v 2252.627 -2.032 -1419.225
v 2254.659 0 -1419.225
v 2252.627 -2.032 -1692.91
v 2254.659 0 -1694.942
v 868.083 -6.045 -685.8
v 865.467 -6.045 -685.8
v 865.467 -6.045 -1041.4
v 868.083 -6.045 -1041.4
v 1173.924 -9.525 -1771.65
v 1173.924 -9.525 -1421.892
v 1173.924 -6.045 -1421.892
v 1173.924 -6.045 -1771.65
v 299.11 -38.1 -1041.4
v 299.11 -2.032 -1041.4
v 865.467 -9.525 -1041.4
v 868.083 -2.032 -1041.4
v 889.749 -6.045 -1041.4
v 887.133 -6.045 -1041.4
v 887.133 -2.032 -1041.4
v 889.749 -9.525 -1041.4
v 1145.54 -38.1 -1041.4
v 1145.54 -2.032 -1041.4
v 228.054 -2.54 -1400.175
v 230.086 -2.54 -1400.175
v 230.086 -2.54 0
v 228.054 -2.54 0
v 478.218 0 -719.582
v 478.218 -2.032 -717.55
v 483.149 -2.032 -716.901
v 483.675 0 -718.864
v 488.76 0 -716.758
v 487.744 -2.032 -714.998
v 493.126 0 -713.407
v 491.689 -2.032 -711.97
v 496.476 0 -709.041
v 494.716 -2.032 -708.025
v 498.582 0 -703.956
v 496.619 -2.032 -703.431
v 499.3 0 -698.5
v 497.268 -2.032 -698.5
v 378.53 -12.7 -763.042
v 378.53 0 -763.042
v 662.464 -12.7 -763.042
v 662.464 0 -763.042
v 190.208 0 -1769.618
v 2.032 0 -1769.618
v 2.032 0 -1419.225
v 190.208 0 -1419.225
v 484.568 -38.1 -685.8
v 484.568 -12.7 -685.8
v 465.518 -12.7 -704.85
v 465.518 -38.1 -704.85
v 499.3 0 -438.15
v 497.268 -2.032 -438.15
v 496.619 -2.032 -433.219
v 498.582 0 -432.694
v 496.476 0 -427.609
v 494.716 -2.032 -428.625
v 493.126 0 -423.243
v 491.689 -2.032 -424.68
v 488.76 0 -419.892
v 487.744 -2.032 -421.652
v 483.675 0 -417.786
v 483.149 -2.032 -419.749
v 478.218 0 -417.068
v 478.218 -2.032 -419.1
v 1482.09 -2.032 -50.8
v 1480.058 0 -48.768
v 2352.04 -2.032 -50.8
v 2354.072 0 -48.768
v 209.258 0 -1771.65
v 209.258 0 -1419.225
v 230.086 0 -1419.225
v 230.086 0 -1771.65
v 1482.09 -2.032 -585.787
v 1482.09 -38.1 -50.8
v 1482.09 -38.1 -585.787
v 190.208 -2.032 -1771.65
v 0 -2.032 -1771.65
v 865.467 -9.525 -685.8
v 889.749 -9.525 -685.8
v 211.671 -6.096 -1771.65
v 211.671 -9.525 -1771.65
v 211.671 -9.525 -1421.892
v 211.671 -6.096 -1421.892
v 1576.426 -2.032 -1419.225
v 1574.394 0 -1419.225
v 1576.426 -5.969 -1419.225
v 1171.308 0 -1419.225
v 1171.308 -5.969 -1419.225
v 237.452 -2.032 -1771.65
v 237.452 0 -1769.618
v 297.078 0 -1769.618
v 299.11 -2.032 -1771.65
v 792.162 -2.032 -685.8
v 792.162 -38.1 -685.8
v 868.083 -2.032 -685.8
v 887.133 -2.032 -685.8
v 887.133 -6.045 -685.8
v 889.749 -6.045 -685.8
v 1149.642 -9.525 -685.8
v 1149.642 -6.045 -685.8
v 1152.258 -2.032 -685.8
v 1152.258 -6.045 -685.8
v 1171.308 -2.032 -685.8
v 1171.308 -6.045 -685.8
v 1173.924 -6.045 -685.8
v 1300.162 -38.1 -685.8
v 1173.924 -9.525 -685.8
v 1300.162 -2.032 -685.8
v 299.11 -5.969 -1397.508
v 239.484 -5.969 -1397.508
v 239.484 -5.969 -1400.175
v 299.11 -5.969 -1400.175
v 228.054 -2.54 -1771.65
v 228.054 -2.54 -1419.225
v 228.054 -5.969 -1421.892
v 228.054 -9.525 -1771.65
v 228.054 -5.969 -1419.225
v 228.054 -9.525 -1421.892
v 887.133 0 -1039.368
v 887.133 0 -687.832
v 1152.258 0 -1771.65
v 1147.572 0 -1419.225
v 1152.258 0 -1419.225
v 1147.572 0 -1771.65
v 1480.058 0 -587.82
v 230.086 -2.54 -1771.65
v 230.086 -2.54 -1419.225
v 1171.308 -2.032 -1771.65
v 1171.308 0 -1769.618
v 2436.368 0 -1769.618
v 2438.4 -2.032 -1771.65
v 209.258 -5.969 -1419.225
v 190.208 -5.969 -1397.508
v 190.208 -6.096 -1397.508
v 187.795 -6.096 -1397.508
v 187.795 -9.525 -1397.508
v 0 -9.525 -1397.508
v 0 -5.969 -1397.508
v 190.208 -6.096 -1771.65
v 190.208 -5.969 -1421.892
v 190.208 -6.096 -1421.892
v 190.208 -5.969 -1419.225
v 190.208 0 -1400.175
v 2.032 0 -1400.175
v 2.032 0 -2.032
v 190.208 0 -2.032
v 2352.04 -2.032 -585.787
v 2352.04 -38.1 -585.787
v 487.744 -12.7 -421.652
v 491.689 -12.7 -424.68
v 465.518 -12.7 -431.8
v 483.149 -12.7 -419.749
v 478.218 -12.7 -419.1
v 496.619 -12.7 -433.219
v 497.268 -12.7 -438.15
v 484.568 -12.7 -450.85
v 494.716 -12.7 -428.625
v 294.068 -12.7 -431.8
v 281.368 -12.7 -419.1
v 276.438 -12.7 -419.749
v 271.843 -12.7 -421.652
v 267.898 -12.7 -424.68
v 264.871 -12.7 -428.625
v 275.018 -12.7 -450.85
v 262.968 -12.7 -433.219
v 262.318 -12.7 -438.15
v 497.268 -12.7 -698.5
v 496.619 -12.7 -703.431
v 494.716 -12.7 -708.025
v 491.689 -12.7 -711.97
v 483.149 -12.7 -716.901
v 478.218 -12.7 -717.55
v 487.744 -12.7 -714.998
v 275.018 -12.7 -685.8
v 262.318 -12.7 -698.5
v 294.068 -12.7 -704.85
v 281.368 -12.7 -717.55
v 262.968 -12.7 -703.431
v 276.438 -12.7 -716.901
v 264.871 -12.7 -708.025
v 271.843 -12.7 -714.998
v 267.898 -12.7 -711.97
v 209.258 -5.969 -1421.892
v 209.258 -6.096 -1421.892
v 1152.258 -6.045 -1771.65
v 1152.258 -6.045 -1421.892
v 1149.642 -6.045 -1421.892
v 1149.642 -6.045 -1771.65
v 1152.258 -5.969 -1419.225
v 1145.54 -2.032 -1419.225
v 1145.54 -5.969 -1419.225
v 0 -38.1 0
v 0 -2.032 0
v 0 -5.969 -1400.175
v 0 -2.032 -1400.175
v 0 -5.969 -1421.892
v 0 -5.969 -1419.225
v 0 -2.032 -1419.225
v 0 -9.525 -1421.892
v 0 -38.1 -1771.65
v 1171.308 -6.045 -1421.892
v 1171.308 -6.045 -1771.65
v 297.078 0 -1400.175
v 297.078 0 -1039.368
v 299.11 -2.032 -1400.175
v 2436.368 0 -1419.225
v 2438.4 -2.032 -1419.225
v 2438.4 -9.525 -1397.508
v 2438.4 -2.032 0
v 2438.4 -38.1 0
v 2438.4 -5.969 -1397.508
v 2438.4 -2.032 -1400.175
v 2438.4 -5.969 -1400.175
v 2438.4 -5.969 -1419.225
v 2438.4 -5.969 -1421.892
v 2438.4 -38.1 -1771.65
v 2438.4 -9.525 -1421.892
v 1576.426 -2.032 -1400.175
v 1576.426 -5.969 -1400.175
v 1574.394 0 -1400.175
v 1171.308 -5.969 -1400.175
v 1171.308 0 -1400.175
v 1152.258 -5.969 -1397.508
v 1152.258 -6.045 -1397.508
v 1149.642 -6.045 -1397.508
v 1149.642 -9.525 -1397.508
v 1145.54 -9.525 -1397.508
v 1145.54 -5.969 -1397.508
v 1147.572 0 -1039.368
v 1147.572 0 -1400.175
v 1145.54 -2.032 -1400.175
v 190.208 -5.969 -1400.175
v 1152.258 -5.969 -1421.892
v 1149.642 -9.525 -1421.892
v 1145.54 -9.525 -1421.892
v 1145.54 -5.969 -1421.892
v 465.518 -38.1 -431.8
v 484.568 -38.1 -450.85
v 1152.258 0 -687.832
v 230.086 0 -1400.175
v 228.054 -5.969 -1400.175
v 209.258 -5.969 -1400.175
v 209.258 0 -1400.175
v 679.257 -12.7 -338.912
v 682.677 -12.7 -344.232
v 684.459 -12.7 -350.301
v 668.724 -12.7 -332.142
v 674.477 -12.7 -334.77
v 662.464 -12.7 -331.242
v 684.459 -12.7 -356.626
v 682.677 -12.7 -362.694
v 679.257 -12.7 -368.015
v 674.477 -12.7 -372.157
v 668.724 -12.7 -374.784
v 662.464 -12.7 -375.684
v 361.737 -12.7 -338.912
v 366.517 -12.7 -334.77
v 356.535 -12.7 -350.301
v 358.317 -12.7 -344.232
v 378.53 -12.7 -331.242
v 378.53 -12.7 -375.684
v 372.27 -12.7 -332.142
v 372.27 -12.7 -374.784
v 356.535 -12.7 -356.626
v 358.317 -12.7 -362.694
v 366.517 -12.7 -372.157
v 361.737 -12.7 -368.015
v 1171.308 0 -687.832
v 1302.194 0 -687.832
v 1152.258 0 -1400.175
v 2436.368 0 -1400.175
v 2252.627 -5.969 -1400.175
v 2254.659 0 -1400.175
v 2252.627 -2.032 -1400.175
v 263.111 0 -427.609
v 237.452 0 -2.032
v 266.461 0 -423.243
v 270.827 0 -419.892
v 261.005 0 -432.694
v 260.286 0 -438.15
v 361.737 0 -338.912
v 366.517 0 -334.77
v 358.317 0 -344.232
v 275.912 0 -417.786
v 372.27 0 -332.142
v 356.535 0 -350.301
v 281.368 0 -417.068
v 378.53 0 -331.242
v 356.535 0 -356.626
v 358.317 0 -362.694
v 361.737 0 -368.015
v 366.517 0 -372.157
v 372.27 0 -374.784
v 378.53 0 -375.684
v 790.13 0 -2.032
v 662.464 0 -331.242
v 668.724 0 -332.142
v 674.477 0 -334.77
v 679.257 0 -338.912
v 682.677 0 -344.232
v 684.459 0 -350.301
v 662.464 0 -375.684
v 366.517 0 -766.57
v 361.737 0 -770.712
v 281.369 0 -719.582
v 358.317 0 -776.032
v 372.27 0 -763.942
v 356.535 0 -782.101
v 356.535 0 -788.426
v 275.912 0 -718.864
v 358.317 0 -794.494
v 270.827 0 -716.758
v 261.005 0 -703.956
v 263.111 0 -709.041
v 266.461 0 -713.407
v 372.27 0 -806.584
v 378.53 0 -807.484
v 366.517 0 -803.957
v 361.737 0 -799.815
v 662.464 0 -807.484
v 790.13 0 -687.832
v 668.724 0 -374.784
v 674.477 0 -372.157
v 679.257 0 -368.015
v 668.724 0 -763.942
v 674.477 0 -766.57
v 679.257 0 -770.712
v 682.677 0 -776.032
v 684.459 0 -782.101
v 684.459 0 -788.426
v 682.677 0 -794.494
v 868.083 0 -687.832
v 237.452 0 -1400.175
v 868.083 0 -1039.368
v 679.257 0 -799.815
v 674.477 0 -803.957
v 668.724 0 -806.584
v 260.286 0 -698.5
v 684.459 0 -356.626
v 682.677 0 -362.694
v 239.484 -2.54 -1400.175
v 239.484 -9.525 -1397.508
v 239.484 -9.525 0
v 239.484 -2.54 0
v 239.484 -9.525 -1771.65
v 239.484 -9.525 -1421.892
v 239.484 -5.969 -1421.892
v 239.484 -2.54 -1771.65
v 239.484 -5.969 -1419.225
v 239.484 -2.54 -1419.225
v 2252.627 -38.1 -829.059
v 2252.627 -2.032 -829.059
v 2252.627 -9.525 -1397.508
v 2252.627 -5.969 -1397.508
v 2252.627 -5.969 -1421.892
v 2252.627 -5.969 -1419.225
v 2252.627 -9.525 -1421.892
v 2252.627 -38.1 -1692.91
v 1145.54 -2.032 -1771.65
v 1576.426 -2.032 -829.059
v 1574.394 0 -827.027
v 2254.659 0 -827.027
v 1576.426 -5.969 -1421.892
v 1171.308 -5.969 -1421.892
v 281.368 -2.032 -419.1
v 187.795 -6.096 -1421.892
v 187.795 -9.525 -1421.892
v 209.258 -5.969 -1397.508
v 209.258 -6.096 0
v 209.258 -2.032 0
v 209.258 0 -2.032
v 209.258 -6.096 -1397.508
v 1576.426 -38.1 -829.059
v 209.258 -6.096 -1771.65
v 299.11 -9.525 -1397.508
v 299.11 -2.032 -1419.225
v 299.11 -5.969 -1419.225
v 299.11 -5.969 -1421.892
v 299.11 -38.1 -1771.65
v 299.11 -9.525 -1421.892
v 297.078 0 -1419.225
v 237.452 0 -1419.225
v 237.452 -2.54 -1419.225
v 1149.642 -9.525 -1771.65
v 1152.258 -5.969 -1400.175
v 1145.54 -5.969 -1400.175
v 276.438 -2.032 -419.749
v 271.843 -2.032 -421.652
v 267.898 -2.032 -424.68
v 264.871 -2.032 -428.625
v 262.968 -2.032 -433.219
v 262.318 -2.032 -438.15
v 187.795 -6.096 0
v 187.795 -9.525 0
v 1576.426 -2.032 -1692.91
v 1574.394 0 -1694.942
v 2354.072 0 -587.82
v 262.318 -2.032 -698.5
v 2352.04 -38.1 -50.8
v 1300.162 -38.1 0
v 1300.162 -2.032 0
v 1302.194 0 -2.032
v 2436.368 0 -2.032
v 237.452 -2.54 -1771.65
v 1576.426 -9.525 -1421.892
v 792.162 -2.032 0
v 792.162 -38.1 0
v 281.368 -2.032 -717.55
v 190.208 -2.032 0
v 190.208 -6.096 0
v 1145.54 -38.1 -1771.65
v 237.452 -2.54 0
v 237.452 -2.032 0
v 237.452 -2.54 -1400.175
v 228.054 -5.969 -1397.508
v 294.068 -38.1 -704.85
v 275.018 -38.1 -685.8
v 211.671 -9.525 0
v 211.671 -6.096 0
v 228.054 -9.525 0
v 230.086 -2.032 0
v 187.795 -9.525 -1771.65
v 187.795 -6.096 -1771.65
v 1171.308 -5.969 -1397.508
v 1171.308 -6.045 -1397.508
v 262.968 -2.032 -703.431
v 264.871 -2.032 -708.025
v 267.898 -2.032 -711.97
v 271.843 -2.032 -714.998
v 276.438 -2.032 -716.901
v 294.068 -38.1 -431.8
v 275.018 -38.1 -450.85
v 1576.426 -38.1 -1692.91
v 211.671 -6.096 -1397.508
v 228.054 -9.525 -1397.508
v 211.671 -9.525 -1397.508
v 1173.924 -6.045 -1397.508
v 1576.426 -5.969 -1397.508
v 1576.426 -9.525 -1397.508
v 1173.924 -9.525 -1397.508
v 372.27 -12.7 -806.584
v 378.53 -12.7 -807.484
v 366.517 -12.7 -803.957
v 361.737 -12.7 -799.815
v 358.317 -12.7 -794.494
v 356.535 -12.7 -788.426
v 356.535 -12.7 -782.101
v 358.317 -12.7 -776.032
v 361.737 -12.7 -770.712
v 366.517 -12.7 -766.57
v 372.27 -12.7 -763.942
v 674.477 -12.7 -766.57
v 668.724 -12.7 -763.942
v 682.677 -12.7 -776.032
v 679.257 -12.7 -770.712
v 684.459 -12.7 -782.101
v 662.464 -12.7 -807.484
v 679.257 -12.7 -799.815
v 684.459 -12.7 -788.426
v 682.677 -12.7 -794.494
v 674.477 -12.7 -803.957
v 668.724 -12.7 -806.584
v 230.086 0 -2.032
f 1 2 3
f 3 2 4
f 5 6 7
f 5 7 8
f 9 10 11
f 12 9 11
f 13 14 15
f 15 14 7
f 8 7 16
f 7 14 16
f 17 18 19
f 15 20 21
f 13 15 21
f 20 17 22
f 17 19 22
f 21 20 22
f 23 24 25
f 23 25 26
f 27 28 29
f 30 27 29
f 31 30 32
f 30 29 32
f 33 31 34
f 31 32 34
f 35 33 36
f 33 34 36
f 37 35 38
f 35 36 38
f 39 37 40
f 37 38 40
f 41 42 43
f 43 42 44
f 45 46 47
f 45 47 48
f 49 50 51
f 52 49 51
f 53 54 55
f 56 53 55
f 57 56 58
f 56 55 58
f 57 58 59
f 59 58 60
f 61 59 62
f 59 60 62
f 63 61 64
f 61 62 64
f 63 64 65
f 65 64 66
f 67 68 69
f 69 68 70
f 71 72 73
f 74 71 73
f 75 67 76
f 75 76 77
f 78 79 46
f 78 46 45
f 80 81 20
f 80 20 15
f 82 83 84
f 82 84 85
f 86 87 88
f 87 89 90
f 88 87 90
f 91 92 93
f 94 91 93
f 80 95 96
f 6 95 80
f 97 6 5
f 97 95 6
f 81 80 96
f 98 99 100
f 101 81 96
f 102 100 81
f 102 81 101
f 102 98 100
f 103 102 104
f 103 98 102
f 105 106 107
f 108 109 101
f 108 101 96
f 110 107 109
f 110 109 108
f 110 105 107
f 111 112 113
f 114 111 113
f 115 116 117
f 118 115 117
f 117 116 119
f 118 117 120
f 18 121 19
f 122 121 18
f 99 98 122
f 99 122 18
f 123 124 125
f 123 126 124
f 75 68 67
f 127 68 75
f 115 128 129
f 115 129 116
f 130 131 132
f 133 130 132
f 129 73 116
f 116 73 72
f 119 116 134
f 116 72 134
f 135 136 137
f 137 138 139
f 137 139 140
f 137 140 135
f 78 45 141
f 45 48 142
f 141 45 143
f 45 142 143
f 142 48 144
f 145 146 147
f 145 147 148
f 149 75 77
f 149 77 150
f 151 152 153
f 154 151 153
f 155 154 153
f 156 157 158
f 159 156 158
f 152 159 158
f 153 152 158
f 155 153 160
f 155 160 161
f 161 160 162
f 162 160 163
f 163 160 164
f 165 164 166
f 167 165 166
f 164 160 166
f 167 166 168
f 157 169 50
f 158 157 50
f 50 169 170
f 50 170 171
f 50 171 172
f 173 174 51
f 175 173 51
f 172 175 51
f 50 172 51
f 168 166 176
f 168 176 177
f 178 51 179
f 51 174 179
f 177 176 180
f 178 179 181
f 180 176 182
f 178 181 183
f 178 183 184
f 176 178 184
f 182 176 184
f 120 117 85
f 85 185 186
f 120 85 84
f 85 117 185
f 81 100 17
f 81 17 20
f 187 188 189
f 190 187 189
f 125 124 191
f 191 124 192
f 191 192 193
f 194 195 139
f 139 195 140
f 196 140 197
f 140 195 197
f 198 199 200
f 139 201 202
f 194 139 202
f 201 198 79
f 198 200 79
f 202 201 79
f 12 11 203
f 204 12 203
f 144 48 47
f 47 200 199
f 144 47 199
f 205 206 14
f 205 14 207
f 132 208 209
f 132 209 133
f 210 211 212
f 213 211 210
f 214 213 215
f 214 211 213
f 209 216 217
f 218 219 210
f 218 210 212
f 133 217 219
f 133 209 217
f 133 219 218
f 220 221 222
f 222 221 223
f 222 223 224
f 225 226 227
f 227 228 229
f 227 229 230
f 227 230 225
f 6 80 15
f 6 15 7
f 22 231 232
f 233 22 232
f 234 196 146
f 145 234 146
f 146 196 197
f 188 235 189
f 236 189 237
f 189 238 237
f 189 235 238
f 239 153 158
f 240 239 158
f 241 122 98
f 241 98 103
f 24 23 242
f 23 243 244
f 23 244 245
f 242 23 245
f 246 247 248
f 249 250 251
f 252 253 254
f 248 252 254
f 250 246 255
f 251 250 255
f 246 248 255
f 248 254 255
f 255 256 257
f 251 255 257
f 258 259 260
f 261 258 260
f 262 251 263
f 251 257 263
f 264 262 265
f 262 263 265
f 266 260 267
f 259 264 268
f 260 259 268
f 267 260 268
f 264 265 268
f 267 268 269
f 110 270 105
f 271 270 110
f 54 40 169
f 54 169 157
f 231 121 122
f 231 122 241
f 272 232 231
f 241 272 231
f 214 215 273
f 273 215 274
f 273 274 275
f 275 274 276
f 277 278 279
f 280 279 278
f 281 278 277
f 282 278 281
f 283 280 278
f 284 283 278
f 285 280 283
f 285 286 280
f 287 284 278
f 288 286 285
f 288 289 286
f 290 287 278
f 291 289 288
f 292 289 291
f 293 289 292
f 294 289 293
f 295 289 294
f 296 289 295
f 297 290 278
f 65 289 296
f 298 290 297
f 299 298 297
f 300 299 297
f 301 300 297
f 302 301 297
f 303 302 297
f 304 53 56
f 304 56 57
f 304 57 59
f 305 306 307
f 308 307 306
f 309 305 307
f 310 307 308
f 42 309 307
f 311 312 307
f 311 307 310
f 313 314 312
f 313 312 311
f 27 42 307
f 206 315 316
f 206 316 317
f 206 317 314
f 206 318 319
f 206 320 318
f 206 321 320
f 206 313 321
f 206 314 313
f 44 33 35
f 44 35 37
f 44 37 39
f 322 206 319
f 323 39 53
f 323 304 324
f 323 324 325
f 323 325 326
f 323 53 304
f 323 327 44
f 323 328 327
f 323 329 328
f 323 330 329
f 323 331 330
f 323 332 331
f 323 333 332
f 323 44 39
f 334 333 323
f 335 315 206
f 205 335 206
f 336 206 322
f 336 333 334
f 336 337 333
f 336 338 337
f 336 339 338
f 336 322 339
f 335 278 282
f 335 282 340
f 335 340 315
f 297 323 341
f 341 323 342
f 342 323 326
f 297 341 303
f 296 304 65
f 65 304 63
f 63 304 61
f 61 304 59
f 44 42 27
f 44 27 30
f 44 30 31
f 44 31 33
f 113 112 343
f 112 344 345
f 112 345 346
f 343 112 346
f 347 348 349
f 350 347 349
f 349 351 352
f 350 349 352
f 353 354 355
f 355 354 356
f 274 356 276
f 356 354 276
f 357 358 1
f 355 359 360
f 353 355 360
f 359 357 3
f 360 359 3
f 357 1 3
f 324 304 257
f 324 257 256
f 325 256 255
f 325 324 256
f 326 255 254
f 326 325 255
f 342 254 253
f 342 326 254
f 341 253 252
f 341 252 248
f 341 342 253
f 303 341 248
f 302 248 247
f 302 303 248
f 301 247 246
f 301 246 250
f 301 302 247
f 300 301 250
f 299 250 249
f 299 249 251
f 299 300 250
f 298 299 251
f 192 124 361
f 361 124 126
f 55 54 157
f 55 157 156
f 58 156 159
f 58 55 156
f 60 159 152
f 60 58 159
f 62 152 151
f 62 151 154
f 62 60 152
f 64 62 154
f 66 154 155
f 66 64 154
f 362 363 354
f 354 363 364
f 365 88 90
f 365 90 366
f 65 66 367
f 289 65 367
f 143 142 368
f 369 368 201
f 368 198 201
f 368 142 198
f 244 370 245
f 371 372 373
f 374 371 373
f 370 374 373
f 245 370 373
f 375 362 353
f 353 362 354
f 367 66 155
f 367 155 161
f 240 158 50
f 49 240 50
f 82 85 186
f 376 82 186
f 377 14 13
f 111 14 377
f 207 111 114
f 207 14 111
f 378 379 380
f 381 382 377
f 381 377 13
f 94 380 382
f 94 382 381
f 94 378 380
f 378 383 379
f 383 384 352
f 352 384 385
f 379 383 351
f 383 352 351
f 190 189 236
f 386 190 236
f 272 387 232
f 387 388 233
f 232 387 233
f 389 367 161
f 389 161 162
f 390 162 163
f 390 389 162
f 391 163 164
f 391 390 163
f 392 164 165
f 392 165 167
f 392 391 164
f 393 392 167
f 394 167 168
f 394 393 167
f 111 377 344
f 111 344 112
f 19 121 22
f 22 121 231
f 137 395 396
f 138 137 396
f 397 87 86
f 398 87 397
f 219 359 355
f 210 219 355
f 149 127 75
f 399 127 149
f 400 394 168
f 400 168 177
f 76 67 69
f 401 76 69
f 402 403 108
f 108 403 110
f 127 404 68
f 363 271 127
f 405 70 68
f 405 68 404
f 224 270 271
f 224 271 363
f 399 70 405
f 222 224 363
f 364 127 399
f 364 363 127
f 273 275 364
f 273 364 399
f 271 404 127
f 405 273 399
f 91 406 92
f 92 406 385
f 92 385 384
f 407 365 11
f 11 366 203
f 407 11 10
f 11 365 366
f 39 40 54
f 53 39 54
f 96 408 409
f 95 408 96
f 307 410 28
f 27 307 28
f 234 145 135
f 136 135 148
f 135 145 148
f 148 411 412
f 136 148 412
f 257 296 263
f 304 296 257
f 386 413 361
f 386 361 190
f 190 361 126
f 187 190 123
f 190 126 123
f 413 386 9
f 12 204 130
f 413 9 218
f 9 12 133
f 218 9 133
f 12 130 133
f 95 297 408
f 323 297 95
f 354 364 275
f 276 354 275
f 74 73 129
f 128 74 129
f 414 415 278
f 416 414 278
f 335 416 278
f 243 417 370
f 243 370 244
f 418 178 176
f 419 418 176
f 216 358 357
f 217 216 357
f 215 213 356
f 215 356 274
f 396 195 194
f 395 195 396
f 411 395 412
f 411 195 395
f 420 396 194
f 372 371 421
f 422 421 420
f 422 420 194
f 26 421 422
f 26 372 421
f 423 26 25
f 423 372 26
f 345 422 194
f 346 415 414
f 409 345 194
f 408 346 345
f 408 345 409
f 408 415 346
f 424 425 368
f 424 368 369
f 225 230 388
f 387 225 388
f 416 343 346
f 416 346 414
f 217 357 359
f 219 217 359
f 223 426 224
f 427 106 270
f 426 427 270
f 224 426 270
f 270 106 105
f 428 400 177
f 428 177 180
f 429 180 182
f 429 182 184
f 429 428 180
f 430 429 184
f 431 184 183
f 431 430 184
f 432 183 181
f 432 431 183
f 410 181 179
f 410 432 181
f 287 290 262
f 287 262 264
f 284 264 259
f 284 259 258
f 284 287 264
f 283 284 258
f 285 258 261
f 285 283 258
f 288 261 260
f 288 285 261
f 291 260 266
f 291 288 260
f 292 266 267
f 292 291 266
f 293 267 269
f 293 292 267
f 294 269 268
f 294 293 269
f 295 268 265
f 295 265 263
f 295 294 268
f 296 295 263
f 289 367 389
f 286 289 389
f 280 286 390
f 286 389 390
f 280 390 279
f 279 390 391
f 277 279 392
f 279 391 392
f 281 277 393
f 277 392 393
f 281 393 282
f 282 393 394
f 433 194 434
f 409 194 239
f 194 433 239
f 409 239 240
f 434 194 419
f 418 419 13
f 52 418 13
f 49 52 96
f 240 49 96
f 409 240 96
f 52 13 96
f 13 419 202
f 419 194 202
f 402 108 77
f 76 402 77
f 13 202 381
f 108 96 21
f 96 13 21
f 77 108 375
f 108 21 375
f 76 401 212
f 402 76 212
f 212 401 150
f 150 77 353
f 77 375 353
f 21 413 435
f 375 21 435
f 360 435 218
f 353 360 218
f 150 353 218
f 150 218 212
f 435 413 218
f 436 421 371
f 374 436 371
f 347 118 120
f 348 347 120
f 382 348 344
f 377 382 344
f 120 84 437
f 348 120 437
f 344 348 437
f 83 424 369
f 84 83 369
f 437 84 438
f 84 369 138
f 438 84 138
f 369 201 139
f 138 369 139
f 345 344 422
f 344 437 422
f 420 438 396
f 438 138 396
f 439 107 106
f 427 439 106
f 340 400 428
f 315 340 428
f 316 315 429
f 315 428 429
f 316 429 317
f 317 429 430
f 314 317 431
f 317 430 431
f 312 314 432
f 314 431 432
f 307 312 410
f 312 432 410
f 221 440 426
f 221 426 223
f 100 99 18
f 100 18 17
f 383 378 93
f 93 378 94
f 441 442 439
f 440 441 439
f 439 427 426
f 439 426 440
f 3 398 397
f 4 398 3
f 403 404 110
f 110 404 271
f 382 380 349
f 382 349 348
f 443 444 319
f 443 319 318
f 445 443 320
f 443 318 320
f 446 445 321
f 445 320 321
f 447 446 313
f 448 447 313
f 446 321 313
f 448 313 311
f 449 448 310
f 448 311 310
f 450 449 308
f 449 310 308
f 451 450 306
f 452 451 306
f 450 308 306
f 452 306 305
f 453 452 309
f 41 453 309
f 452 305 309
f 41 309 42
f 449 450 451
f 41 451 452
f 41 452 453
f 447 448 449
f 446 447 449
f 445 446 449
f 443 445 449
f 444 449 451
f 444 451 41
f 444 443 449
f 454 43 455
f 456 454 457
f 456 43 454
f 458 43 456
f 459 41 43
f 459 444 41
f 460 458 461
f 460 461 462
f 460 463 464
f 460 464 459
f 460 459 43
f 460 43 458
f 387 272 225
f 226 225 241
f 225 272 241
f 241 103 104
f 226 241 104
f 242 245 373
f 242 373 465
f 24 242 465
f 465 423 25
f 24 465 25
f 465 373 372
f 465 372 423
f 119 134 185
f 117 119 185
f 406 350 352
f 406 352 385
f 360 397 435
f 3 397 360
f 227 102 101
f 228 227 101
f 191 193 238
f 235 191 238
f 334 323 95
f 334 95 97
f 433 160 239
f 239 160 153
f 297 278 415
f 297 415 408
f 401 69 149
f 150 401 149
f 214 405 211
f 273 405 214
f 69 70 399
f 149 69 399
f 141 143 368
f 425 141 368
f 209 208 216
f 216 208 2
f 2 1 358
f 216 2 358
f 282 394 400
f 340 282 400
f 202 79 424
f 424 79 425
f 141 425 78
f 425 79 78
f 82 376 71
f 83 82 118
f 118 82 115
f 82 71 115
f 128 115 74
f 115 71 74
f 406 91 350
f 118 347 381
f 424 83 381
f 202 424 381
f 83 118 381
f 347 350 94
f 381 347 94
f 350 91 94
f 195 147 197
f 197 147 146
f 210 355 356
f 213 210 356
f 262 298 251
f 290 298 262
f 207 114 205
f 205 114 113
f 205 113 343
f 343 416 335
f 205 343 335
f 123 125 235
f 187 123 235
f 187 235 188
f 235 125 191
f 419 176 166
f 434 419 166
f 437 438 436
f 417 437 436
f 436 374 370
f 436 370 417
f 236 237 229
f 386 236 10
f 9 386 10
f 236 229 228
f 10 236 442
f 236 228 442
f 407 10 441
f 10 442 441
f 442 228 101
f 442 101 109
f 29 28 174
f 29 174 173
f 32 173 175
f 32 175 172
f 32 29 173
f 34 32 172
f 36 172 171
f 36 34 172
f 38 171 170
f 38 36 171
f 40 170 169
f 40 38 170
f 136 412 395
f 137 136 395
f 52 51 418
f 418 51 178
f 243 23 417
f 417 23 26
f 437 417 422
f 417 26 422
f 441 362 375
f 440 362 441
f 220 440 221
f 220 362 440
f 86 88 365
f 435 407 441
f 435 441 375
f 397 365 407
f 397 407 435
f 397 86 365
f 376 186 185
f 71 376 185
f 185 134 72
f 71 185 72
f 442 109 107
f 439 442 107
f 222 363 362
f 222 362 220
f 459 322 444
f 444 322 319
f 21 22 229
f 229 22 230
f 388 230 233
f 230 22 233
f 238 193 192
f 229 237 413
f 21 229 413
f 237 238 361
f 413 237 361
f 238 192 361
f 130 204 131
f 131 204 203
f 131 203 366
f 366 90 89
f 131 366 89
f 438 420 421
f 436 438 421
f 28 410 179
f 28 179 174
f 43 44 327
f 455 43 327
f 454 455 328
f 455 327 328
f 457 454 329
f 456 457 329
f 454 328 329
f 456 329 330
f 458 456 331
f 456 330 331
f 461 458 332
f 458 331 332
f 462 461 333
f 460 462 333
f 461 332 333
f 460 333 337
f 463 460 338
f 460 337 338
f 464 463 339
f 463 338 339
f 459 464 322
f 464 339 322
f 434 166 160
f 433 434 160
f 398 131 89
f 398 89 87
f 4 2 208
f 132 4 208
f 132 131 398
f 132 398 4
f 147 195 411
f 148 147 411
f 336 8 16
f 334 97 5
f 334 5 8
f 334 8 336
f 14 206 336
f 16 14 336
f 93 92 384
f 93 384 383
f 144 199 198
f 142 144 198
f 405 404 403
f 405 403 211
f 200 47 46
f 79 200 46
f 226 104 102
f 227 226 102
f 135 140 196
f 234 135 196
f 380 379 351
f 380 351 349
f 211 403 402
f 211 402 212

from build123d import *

# Parameters (mm, degrees)
SKETCH1_W           = 2438.4
SKETCH1_H           = 1771.65
BOSS_EXTRUDE1_DEPTH = 38.1
SKETCH2_W           = 869.95
SKETCH2_H           = 534.9875
CUT_EXTRUDE1_DEPTH  = 39.1
SKETCH3_W           = 508
SKETCH3_H           = 685.8
CUT_EXTRUDE2_DEPTH  = 39.1
SKETCH4_W           = 676.20134
SKETCH4_H           = 863.85146
CUT_EXTRUDE3_DEPTH  = 39.1
SKETCH5_W           = 846.4296
SKETCH5_H           = 730.25
CUT_EXTRUDE4_DEPTH  = 39.1
CUT_EXTRUDE5_DEPTH  = 12.7
CUT_EXTRUDE6_DEPTH  = 26.4
CUT_EXTRUDE7_DEPTH  = 1086.85
CUT_EXTRUDE8_DEPTH  = 1772.65
CUT_EXTRUDE10_DEPTH = 2439.4
CHAMFER4_SIZE       = 2.032
CUT_EXTRUDE12_DEPTH = 12.7
CUT_EXTRUDE13_DEPTH = 12.7


with BuildPart() as part:
    # Sketch1 → Boss-Extrude1 (new body)
    with BuildSketch(Plane(origin=(0, 0, 0), x_dir=(1, 0, 0), z_dir=(0, 1, 0))):
        with Locations((1219.2, 885.825)):
            Rectangle(SKETCH1_W, SKETCH1_H)
    extrude(amount=-BOSS_EXTRUDE1_DEPTH)

    # Sketch2 → Cut-Extrude1 (cut, through all)
    with BuildSketch(Plane(origin=(0, 0, 0), x_dir=(1, 0, 0), z_dir=(0, 1, 0))):
        with Locations((1917.065, 318.29375)):
            Rectangle(SKETCH2_W, SKETCH2_H)
    extrude(amount=-CUT_EXTRUDE1_DEPTH, mode=Mode.SUBTRACT)

    # Sketch3 → Cut-Extrude2 (cut, through all)
    with BuildSketch(Plane(origin=(0, 0, 0), x_dir=(1, 0, 0), z_dir=(0, 1, 0))):
        with Locations((1046.1625, 342.9)):
            Rectangle(SKETCH3_W, SKETCH3_H)
    extrude(amount=-CUT_EXTRUDE2_DEPTH, mode=Mode.SUBTRACT)

    # Sketch4 → Cut-Extrude3 (cut, through all)
    with BuildSketch(Plane(origin=(0, 0, 0), x_dir=(1, 0, 0), z_dir=(0, 1, 0))):
        with Locations((1914.52627, 1260.98427)):
            Rectangle(SKETCH4_W, SKETCH4_H)
    extrude(amount=-CUT_EXTRUDE3_DEPTH, mode=Mode.SUBTRACT)

    # Sketch5 → Cut-Extrude4 (cut, through all)
    with BuildSketch(Plane(origin=(0, 0, 0), x_dir=(1, 0, 0), z_dir=(0, 1, 0))):
        with Locations((722.3252, 1406.525)):
            Rectangle(SKETCH5_W, SKETCH5_H)
    extrude(amount=-CUT_EXTRUDE4_DEPTH, mode=Mode.SUBTRACT)

    # Sketch7 → Cut-Extrude5 (cut)
    with BuildSketch(Plane(origin=(0, 0, 0), x_dir=(1, 0, 0), z_dir=(0, 1, 0))):
        with BuildLine():
            Line((281.3685, 717.55), (478.2185, 717.55))
            ThreePointArc((478.2185, 717.55), (491.688884182, 711.970384182), (497.2685, 698.5))
            Line((497.2685, 698.5), (497.2685, 438.15))
            ThreePointArc((497.2685, 438.15), (491.688884182, 424.679615818), (478.2185, 419.1))
            Line((478.2185, 419.1), (281.3685, 419.1))
            ThreePointArc((281.3685, 419.1), (267.898115818, 424.679615818), (262.3185, 438.15))
            Line((262.3185, 438.15), (262.3185, 698.5))
            ThreePointArc((262.3185, 698.5), (267.898115818, 711.970384182), (281.3685, 717.55))
        make_face()
    extrude(amount=-CUT_EXTRUDE5_DEPTH, mode=Mode.SUBTRACT)

    # Sketch8 → Cut-Extrude6 (cut, through all)
    with BuildSketch(Plane(origin=(0, -12.7, 0), x_dir=(1, 0, 0), z_dir=(0, 1, 0))):
        Polygon((294.0685, 704.85), (275.0185, 685.8), (275.0185, 450.85), (294.0685, 431.8), (465.5185, 431.8), (484.5685, 450.85), (484.5685, 685.8), (465.5185, 704.85), align=None)
    extrude(amount=-CUT_EXTRUDE6_DEPTH, mode=Mode.SUBTRACT)

    # Sketch10 → Cut-Extrude7 (cut, through all)
    with BuildSketch(Plane.XY.offset(-685.8)):
        Polygon((1171.3083, 0), (1152.2583, 0), (1152.2583, -6.0452), (1149.6421, -6.0452), (1149.6421, -9.525), (1173.9245, -9.525), (1173.9245, -6.0452), (1171.3083, -6.0452), align=None)
        Polygon((889.7493, -9.525), (865.4669, -9.525), (865.4669, -6.0452), (868.0831, -6.0452), (868.0831, 0), (887.1331, 0), (887.1331, -6.0452), (889.7493, -6.0452), align=None)
    extrude(amount=-CUT_EXTRUDE7_DEPTH, mode=Mode.SUBTRACT)

    # Sketch12 → Cut-Extrude8 (cut, through all)
    with BuildSketch(Plane.XY):
        Polygon((209.2579, 0), (190.2079, 0), (190.2079, -6.096), (187.7949, -6.096), (187.7949, -9.525), (211.6709, -9.525), (211.6709, -6.096), (209.2579, -6.096), align=None)
        Polygon((237.4519, 0), (230.0859, 0), (230.0859, -2.54), (228.0539, -2.54), (228.0539, -9.525), (239.4839, -9.525), (239.4839, -2.54), (237.4519, -2.54), align=None)
    extrude(amount=-CUT_EXTRUDE8_DEPTH, mode=Mode.SUBTRACT)

    # Sketch16 → Cut-Extrude10 (cut, through all)
    with BuildSketch(Plane.ZY):
        Polygon((-1421.892, -9.525), (-1397.508, -9.525), (-1397.508, -5.969), (-1400.175, -5.969), (-1400.175, 0), (-1419.225, 0), (-1419.225, -5.969), (-1421.892, -5.969), align=None)
    extrude(amount=-CUT_EXTRUDE10_DEPTH, mode=Mode.SUBTRACT)

    # Chamfer4
    chamfer4_edges = [part.edges().sort_by_distance(p)[0] for p in [
        (1016.33655, 0, -1041.4),
        (1019.6957, 0, -685.8),
        (830.1228, 0, -685.8),
        (219.6719, 0, 0),
        (514.8072, 0, 0),
        (2352.04, 0, -318.29375),
        (95.10395, 0, -1771.65),
        (1917.065, 0, -585.7875),
        (1482.09, 0, -318.29375),
        (1917.065, 0, -50.8),
        (1145.54, 0, -1595.4375),
        (299.1104, 0, -1220.7875),
        (1576.4256, 0, -1114.61677),
        (2252.62694, 0, -1556.0675),
        (1869.28125, 0, 0),
        (2438.4, 0, -1595.4375),
        (0, 0, -700.0875),
        (792.1625, 0, -342.9),
        (1300.1625, 0, -342.9),
        (1235.7354, 0, -685.8),
        (0, 0, -1595.4375),
        (1804.85415, 0, -1771.65),
        (2252.62694, 0, -1114.61677),
        (1914.52627, 0, -1692.91),
        (1576.4256, 0, -1556.0675),
        (1914.52627, 0, -829.05854),
        (2438.4, 0, -700.0875),
        (95.10395, 0, 0),
        (268.28115, 0, -1771.65),
        (299.1104, 0, -1595.4375),
        (583.59675, 0, -1041.4),
        (1145.54, 0, -1220.7875),
        (491.688884182, 0, -424.679615818),
        (497.2685, 0, -568.325),
        (491.688884182, 0, -711.970384182),
        (379.7935, 0, -717.55),
        (267.898115818, 0, -711.970384182),
        (262.3185, 0, -568.325),
        (267.898115818, 0, -424.679615818),
        (379.7935, 0, -419.1),
    ]]
    chamfer(chamfer4_edges, length=CHAMFER4_SIZE)

    # Sketch17 → Cut-Extrude12 (cut)
    with BuildSketch(Plane(origin=(0, 0, 0), x_dir=(1, 0, 0), z_dir=(0, 1, 0))):
        with BuildLine():
            Line((378.53038292, 763.042172), (662.463619231, 763.042172))
            ThreePointArc((662.463619231, 763.042172), (684.684727521, 785.263280291), (662.463619231, 807.484388581))
            Line((662.463619231, 807.484388581), (378.53038292, 807.484388581))
            ThreePointArc((378.53038292, 807.484388581), (356.309274629, 785.263280291), (378.53038292, 763.042172))
        make_face()
    extrude(amount=-CUT_EXTRUDE12_DEPTH, mode=Mode.SUBTRACT)

    # Sketch18 → Cut-Extrude13 (cut)
    with BuildSketch(Plane(origin=(0, 0, 0), x_dir=(1, 0, 0), z_dir=(0, 1, 0))):
        with BuildLine():
            Line((378.53038292, 375.684388581), (662.463619231, 375.684388581))
            ThreePointArc((662.463619231, 375.684388581), (684.684727521, 353.463280291), (662.463619231, 331.242172))
            Line((662.463619231, 331.242172), (378.53038292, 331.242172))
            ThreePointArc((378.53038292, 331.242172), (356.309274629, 353.463280291), (378.53038292, 375.684388581))
        make_face()
    extrude(amount=-CUT_EXTRUDE13_DEPTH, mode=Mode.SUBTRACT)


solid = part.part
